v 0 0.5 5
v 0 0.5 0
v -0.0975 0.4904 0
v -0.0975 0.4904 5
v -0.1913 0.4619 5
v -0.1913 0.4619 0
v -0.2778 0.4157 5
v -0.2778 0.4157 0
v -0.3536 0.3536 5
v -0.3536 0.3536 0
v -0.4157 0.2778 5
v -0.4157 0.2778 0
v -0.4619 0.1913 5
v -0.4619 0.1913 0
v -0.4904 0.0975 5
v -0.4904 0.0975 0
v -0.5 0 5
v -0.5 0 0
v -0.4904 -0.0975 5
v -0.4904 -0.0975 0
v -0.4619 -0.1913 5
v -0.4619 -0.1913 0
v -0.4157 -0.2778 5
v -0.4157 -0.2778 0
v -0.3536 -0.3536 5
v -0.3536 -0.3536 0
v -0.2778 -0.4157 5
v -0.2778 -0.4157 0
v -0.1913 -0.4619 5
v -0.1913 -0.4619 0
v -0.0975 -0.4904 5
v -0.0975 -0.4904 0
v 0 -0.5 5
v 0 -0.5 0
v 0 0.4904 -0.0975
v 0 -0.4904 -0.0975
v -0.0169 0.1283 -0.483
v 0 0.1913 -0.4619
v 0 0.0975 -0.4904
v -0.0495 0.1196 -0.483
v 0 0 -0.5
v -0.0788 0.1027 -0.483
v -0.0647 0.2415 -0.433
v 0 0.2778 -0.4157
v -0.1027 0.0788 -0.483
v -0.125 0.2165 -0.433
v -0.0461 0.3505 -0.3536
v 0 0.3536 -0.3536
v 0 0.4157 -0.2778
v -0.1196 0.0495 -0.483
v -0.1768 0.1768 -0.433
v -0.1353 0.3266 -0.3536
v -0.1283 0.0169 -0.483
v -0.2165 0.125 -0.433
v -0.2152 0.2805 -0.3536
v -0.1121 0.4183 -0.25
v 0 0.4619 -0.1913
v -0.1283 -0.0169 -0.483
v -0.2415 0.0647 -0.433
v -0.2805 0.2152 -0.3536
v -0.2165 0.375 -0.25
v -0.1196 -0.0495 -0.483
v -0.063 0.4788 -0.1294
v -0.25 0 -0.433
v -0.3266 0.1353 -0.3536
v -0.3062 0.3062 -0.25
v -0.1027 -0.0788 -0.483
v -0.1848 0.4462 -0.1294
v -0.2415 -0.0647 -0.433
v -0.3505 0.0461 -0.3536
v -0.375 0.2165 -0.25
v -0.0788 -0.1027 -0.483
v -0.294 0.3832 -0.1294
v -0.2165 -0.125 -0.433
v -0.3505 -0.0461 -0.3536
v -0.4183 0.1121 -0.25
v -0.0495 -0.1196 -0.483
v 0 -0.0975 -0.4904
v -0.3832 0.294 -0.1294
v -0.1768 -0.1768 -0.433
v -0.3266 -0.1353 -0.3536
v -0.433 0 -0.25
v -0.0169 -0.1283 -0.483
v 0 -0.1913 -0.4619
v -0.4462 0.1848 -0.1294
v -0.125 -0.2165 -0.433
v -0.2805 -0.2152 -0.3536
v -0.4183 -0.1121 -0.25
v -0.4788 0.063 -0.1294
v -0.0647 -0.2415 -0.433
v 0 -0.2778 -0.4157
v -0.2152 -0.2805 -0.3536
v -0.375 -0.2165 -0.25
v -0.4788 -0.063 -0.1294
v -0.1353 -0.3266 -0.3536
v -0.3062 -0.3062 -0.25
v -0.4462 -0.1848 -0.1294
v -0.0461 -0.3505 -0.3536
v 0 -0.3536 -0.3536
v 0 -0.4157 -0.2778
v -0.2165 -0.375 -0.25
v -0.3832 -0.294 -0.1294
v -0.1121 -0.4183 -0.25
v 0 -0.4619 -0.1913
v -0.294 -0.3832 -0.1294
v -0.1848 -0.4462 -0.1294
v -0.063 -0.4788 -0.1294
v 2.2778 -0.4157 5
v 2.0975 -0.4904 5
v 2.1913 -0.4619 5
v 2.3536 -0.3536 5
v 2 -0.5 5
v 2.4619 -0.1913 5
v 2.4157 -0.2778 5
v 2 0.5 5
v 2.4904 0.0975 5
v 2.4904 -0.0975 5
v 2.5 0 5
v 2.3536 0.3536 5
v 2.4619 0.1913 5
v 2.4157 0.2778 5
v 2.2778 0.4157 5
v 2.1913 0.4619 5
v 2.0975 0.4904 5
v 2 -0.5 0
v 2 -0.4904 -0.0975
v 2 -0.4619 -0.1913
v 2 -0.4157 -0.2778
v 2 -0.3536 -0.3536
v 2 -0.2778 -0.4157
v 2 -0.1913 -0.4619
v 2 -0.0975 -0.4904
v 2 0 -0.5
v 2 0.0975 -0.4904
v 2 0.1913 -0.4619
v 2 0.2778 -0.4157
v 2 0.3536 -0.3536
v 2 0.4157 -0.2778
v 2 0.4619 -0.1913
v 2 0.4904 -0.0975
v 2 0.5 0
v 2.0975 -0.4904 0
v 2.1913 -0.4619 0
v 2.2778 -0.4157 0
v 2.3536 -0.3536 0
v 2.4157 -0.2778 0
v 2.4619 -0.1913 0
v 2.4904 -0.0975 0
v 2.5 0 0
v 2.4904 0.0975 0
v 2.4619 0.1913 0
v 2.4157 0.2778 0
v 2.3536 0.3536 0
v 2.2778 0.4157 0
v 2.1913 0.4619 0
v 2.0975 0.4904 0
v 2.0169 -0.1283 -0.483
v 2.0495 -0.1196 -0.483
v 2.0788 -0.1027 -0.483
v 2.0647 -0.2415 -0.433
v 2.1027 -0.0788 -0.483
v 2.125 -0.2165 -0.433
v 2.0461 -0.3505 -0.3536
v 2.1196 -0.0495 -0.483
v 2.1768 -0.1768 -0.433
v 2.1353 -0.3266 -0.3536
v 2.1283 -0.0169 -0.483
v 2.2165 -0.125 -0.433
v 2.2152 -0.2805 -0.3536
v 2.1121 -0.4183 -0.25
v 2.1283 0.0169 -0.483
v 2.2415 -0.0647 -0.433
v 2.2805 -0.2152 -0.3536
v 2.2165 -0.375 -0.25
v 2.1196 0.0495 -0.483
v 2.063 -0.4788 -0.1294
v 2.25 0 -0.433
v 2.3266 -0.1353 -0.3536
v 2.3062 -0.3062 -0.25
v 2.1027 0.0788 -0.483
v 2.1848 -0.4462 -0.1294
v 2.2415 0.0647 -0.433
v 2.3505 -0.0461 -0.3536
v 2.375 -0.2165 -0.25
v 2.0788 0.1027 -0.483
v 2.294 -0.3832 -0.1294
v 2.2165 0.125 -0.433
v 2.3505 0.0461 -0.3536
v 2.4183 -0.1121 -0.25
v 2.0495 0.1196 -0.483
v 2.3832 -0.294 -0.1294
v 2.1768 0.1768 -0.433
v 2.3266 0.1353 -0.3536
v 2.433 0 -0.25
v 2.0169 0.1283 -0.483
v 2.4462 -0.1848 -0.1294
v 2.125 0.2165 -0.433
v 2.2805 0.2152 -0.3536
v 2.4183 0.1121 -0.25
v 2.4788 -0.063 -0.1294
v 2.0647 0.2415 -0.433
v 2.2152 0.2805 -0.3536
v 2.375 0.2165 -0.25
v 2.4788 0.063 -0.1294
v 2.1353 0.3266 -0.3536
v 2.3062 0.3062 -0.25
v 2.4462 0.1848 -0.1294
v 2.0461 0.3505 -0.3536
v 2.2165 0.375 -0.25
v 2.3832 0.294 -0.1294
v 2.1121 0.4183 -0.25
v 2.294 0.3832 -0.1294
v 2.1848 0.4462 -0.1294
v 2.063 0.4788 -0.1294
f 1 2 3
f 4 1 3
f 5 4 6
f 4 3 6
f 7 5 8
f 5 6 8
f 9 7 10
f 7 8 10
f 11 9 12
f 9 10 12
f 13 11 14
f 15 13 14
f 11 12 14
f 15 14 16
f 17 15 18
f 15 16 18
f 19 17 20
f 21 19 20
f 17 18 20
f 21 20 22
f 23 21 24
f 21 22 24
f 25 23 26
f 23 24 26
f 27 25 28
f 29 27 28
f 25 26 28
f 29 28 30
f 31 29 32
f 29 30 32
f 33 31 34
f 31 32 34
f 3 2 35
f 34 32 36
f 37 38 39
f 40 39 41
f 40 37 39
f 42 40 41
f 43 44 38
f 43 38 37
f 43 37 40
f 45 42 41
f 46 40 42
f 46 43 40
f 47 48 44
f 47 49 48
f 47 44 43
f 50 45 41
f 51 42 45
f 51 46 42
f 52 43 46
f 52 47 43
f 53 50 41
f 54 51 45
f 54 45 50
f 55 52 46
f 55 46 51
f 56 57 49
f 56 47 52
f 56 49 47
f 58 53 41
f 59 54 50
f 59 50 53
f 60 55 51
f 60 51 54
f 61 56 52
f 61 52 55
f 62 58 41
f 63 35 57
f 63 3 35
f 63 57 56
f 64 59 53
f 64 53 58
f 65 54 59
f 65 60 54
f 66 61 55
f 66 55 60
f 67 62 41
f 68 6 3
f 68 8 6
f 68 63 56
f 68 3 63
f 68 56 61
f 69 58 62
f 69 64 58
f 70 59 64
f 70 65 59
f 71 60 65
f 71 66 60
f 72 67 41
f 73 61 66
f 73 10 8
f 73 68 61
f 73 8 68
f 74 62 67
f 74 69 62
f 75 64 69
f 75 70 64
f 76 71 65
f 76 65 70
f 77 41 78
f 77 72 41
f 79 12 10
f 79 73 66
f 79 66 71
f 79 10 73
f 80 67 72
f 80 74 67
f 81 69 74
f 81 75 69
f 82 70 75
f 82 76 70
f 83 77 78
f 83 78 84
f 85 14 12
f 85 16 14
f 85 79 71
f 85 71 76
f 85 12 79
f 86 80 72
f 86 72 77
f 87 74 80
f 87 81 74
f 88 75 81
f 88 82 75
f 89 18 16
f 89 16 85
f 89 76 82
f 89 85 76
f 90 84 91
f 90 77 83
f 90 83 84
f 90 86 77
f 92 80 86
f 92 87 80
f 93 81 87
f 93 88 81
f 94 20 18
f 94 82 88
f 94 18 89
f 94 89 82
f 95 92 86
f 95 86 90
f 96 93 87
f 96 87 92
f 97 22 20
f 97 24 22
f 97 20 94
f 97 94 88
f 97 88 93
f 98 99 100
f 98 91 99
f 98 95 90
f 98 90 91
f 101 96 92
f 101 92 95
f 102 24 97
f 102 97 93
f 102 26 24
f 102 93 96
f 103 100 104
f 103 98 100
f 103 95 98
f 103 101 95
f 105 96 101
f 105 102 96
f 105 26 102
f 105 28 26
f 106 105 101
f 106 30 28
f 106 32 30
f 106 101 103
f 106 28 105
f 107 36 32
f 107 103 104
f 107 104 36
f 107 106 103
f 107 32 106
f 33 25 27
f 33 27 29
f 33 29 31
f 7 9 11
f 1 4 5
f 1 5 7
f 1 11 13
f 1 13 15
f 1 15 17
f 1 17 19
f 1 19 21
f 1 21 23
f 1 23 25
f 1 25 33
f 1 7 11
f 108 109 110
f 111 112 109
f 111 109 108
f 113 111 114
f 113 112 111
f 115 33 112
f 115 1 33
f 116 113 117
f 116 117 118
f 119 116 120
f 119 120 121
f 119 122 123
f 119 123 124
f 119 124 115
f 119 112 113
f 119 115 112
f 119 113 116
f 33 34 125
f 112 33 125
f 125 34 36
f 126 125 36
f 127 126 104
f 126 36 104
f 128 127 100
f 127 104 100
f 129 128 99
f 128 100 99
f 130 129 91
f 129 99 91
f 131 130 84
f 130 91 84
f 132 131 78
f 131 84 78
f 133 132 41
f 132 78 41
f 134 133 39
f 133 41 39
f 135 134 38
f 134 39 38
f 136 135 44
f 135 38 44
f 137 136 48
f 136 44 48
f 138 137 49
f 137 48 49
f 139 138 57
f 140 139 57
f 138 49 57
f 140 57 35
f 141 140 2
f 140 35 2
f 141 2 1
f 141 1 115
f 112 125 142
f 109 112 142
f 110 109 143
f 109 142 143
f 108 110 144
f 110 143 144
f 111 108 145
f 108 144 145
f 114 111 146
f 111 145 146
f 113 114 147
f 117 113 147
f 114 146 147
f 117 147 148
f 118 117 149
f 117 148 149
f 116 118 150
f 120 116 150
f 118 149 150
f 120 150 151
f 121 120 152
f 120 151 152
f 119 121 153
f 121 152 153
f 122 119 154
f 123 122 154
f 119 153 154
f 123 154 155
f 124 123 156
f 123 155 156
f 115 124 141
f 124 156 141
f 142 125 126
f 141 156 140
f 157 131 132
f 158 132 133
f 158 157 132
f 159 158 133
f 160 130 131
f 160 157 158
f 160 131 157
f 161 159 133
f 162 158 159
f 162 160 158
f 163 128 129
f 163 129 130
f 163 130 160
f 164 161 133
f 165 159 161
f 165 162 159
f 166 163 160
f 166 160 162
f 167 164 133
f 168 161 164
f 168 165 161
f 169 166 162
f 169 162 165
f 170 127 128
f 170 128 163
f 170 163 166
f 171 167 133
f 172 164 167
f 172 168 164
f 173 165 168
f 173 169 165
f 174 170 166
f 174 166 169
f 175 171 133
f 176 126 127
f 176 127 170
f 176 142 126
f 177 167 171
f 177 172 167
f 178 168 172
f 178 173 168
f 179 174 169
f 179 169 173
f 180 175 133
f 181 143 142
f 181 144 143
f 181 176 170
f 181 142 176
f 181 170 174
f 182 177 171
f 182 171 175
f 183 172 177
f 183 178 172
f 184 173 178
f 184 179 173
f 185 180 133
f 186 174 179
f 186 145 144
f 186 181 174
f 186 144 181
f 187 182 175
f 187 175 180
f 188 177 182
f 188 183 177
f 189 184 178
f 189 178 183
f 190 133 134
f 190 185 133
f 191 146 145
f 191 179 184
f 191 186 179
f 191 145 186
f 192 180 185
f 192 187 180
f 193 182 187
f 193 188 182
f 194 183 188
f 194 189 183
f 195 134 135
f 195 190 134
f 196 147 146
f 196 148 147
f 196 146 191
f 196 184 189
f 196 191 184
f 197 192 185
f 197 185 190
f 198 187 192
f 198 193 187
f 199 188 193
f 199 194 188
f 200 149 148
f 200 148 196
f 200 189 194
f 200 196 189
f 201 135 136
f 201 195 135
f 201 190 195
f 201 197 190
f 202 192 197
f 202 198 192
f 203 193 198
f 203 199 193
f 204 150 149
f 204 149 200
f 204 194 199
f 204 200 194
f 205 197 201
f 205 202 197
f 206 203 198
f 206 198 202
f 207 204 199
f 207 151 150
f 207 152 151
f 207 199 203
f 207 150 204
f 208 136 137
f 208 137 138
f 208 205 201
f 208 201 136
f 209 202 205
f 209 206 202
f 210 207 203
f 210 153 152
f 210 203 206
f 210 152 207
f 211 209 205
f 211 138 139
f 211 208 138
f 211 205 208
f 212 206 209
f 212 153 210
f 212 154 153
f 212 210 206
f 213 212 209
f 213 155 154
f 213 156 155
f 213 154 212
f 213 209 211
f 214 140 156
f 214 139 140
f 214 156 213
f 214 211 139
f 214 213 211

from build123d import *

# Parameters (mm, degrees)
CYLINDER_R     = 0.5
CYLINDER_DEPTH = 2
PAD001_DEPTH   = 5


with BuildPart() as sphere:
    # Sphere → Sphere (revolve)
    with BuildSketch(Plane.XZ):
        with BuildLine():
            ThreePointArc((0, -0.5), (0.5, 0), (0, 0.5))
            Line((0, 0.5), (0, -0.5))
        make_face()
    revolve(axis=Axis((0, 0, 0), (0, 0, 1)))


with BuildPart() as sphere001:
    # Sphere001 → Sphere001 (revolve)
    with BuildSketch(Plane(origin=(2, 0, 0), x_dir=(1, 0, 0), z_dir=(0, -1, 0))):
        with BuildLine():
            ThreePointArc((0, -0.5), (0.5, 0), (0, 0.5))
            Line((0, 0.5), (0, -0.5))
        make_face()
    revolve(axis=Axis((2, 0, 0), (0, 0, 1)))


with BuildPart() as body001:
    # Cylinder → Cylinder (new body)
    with BuildSketch(Plane(origin=(0, 0, 0), x_dir=(0, 0, -1), z_dir=(1, 0, 0))):
        Circle(CYLINDER_R)
    extrude(amount=CYLINDER_DEPTH)

    # Fusion: union Sphere, Sphere001
    add(sphere.part)
    add(sphere001.part)

    # Sketch002 → Pad001 (new body)
    with BuildSketch(Plane.XY):
        with BuildLine():
            ThreePointArc((0, 0.5), (-0.5, 0), (0, -0.5))
            Line((0, -0.5), (2, -0.5))
            ThreePointArc((2, -0.5), (2.5, 0), (2, 0.5))
            Line((0, 0.5), (2, 0.5))
        make_face()
    extrude(amount=PAD001_DEPTH)


solid = body001.part
